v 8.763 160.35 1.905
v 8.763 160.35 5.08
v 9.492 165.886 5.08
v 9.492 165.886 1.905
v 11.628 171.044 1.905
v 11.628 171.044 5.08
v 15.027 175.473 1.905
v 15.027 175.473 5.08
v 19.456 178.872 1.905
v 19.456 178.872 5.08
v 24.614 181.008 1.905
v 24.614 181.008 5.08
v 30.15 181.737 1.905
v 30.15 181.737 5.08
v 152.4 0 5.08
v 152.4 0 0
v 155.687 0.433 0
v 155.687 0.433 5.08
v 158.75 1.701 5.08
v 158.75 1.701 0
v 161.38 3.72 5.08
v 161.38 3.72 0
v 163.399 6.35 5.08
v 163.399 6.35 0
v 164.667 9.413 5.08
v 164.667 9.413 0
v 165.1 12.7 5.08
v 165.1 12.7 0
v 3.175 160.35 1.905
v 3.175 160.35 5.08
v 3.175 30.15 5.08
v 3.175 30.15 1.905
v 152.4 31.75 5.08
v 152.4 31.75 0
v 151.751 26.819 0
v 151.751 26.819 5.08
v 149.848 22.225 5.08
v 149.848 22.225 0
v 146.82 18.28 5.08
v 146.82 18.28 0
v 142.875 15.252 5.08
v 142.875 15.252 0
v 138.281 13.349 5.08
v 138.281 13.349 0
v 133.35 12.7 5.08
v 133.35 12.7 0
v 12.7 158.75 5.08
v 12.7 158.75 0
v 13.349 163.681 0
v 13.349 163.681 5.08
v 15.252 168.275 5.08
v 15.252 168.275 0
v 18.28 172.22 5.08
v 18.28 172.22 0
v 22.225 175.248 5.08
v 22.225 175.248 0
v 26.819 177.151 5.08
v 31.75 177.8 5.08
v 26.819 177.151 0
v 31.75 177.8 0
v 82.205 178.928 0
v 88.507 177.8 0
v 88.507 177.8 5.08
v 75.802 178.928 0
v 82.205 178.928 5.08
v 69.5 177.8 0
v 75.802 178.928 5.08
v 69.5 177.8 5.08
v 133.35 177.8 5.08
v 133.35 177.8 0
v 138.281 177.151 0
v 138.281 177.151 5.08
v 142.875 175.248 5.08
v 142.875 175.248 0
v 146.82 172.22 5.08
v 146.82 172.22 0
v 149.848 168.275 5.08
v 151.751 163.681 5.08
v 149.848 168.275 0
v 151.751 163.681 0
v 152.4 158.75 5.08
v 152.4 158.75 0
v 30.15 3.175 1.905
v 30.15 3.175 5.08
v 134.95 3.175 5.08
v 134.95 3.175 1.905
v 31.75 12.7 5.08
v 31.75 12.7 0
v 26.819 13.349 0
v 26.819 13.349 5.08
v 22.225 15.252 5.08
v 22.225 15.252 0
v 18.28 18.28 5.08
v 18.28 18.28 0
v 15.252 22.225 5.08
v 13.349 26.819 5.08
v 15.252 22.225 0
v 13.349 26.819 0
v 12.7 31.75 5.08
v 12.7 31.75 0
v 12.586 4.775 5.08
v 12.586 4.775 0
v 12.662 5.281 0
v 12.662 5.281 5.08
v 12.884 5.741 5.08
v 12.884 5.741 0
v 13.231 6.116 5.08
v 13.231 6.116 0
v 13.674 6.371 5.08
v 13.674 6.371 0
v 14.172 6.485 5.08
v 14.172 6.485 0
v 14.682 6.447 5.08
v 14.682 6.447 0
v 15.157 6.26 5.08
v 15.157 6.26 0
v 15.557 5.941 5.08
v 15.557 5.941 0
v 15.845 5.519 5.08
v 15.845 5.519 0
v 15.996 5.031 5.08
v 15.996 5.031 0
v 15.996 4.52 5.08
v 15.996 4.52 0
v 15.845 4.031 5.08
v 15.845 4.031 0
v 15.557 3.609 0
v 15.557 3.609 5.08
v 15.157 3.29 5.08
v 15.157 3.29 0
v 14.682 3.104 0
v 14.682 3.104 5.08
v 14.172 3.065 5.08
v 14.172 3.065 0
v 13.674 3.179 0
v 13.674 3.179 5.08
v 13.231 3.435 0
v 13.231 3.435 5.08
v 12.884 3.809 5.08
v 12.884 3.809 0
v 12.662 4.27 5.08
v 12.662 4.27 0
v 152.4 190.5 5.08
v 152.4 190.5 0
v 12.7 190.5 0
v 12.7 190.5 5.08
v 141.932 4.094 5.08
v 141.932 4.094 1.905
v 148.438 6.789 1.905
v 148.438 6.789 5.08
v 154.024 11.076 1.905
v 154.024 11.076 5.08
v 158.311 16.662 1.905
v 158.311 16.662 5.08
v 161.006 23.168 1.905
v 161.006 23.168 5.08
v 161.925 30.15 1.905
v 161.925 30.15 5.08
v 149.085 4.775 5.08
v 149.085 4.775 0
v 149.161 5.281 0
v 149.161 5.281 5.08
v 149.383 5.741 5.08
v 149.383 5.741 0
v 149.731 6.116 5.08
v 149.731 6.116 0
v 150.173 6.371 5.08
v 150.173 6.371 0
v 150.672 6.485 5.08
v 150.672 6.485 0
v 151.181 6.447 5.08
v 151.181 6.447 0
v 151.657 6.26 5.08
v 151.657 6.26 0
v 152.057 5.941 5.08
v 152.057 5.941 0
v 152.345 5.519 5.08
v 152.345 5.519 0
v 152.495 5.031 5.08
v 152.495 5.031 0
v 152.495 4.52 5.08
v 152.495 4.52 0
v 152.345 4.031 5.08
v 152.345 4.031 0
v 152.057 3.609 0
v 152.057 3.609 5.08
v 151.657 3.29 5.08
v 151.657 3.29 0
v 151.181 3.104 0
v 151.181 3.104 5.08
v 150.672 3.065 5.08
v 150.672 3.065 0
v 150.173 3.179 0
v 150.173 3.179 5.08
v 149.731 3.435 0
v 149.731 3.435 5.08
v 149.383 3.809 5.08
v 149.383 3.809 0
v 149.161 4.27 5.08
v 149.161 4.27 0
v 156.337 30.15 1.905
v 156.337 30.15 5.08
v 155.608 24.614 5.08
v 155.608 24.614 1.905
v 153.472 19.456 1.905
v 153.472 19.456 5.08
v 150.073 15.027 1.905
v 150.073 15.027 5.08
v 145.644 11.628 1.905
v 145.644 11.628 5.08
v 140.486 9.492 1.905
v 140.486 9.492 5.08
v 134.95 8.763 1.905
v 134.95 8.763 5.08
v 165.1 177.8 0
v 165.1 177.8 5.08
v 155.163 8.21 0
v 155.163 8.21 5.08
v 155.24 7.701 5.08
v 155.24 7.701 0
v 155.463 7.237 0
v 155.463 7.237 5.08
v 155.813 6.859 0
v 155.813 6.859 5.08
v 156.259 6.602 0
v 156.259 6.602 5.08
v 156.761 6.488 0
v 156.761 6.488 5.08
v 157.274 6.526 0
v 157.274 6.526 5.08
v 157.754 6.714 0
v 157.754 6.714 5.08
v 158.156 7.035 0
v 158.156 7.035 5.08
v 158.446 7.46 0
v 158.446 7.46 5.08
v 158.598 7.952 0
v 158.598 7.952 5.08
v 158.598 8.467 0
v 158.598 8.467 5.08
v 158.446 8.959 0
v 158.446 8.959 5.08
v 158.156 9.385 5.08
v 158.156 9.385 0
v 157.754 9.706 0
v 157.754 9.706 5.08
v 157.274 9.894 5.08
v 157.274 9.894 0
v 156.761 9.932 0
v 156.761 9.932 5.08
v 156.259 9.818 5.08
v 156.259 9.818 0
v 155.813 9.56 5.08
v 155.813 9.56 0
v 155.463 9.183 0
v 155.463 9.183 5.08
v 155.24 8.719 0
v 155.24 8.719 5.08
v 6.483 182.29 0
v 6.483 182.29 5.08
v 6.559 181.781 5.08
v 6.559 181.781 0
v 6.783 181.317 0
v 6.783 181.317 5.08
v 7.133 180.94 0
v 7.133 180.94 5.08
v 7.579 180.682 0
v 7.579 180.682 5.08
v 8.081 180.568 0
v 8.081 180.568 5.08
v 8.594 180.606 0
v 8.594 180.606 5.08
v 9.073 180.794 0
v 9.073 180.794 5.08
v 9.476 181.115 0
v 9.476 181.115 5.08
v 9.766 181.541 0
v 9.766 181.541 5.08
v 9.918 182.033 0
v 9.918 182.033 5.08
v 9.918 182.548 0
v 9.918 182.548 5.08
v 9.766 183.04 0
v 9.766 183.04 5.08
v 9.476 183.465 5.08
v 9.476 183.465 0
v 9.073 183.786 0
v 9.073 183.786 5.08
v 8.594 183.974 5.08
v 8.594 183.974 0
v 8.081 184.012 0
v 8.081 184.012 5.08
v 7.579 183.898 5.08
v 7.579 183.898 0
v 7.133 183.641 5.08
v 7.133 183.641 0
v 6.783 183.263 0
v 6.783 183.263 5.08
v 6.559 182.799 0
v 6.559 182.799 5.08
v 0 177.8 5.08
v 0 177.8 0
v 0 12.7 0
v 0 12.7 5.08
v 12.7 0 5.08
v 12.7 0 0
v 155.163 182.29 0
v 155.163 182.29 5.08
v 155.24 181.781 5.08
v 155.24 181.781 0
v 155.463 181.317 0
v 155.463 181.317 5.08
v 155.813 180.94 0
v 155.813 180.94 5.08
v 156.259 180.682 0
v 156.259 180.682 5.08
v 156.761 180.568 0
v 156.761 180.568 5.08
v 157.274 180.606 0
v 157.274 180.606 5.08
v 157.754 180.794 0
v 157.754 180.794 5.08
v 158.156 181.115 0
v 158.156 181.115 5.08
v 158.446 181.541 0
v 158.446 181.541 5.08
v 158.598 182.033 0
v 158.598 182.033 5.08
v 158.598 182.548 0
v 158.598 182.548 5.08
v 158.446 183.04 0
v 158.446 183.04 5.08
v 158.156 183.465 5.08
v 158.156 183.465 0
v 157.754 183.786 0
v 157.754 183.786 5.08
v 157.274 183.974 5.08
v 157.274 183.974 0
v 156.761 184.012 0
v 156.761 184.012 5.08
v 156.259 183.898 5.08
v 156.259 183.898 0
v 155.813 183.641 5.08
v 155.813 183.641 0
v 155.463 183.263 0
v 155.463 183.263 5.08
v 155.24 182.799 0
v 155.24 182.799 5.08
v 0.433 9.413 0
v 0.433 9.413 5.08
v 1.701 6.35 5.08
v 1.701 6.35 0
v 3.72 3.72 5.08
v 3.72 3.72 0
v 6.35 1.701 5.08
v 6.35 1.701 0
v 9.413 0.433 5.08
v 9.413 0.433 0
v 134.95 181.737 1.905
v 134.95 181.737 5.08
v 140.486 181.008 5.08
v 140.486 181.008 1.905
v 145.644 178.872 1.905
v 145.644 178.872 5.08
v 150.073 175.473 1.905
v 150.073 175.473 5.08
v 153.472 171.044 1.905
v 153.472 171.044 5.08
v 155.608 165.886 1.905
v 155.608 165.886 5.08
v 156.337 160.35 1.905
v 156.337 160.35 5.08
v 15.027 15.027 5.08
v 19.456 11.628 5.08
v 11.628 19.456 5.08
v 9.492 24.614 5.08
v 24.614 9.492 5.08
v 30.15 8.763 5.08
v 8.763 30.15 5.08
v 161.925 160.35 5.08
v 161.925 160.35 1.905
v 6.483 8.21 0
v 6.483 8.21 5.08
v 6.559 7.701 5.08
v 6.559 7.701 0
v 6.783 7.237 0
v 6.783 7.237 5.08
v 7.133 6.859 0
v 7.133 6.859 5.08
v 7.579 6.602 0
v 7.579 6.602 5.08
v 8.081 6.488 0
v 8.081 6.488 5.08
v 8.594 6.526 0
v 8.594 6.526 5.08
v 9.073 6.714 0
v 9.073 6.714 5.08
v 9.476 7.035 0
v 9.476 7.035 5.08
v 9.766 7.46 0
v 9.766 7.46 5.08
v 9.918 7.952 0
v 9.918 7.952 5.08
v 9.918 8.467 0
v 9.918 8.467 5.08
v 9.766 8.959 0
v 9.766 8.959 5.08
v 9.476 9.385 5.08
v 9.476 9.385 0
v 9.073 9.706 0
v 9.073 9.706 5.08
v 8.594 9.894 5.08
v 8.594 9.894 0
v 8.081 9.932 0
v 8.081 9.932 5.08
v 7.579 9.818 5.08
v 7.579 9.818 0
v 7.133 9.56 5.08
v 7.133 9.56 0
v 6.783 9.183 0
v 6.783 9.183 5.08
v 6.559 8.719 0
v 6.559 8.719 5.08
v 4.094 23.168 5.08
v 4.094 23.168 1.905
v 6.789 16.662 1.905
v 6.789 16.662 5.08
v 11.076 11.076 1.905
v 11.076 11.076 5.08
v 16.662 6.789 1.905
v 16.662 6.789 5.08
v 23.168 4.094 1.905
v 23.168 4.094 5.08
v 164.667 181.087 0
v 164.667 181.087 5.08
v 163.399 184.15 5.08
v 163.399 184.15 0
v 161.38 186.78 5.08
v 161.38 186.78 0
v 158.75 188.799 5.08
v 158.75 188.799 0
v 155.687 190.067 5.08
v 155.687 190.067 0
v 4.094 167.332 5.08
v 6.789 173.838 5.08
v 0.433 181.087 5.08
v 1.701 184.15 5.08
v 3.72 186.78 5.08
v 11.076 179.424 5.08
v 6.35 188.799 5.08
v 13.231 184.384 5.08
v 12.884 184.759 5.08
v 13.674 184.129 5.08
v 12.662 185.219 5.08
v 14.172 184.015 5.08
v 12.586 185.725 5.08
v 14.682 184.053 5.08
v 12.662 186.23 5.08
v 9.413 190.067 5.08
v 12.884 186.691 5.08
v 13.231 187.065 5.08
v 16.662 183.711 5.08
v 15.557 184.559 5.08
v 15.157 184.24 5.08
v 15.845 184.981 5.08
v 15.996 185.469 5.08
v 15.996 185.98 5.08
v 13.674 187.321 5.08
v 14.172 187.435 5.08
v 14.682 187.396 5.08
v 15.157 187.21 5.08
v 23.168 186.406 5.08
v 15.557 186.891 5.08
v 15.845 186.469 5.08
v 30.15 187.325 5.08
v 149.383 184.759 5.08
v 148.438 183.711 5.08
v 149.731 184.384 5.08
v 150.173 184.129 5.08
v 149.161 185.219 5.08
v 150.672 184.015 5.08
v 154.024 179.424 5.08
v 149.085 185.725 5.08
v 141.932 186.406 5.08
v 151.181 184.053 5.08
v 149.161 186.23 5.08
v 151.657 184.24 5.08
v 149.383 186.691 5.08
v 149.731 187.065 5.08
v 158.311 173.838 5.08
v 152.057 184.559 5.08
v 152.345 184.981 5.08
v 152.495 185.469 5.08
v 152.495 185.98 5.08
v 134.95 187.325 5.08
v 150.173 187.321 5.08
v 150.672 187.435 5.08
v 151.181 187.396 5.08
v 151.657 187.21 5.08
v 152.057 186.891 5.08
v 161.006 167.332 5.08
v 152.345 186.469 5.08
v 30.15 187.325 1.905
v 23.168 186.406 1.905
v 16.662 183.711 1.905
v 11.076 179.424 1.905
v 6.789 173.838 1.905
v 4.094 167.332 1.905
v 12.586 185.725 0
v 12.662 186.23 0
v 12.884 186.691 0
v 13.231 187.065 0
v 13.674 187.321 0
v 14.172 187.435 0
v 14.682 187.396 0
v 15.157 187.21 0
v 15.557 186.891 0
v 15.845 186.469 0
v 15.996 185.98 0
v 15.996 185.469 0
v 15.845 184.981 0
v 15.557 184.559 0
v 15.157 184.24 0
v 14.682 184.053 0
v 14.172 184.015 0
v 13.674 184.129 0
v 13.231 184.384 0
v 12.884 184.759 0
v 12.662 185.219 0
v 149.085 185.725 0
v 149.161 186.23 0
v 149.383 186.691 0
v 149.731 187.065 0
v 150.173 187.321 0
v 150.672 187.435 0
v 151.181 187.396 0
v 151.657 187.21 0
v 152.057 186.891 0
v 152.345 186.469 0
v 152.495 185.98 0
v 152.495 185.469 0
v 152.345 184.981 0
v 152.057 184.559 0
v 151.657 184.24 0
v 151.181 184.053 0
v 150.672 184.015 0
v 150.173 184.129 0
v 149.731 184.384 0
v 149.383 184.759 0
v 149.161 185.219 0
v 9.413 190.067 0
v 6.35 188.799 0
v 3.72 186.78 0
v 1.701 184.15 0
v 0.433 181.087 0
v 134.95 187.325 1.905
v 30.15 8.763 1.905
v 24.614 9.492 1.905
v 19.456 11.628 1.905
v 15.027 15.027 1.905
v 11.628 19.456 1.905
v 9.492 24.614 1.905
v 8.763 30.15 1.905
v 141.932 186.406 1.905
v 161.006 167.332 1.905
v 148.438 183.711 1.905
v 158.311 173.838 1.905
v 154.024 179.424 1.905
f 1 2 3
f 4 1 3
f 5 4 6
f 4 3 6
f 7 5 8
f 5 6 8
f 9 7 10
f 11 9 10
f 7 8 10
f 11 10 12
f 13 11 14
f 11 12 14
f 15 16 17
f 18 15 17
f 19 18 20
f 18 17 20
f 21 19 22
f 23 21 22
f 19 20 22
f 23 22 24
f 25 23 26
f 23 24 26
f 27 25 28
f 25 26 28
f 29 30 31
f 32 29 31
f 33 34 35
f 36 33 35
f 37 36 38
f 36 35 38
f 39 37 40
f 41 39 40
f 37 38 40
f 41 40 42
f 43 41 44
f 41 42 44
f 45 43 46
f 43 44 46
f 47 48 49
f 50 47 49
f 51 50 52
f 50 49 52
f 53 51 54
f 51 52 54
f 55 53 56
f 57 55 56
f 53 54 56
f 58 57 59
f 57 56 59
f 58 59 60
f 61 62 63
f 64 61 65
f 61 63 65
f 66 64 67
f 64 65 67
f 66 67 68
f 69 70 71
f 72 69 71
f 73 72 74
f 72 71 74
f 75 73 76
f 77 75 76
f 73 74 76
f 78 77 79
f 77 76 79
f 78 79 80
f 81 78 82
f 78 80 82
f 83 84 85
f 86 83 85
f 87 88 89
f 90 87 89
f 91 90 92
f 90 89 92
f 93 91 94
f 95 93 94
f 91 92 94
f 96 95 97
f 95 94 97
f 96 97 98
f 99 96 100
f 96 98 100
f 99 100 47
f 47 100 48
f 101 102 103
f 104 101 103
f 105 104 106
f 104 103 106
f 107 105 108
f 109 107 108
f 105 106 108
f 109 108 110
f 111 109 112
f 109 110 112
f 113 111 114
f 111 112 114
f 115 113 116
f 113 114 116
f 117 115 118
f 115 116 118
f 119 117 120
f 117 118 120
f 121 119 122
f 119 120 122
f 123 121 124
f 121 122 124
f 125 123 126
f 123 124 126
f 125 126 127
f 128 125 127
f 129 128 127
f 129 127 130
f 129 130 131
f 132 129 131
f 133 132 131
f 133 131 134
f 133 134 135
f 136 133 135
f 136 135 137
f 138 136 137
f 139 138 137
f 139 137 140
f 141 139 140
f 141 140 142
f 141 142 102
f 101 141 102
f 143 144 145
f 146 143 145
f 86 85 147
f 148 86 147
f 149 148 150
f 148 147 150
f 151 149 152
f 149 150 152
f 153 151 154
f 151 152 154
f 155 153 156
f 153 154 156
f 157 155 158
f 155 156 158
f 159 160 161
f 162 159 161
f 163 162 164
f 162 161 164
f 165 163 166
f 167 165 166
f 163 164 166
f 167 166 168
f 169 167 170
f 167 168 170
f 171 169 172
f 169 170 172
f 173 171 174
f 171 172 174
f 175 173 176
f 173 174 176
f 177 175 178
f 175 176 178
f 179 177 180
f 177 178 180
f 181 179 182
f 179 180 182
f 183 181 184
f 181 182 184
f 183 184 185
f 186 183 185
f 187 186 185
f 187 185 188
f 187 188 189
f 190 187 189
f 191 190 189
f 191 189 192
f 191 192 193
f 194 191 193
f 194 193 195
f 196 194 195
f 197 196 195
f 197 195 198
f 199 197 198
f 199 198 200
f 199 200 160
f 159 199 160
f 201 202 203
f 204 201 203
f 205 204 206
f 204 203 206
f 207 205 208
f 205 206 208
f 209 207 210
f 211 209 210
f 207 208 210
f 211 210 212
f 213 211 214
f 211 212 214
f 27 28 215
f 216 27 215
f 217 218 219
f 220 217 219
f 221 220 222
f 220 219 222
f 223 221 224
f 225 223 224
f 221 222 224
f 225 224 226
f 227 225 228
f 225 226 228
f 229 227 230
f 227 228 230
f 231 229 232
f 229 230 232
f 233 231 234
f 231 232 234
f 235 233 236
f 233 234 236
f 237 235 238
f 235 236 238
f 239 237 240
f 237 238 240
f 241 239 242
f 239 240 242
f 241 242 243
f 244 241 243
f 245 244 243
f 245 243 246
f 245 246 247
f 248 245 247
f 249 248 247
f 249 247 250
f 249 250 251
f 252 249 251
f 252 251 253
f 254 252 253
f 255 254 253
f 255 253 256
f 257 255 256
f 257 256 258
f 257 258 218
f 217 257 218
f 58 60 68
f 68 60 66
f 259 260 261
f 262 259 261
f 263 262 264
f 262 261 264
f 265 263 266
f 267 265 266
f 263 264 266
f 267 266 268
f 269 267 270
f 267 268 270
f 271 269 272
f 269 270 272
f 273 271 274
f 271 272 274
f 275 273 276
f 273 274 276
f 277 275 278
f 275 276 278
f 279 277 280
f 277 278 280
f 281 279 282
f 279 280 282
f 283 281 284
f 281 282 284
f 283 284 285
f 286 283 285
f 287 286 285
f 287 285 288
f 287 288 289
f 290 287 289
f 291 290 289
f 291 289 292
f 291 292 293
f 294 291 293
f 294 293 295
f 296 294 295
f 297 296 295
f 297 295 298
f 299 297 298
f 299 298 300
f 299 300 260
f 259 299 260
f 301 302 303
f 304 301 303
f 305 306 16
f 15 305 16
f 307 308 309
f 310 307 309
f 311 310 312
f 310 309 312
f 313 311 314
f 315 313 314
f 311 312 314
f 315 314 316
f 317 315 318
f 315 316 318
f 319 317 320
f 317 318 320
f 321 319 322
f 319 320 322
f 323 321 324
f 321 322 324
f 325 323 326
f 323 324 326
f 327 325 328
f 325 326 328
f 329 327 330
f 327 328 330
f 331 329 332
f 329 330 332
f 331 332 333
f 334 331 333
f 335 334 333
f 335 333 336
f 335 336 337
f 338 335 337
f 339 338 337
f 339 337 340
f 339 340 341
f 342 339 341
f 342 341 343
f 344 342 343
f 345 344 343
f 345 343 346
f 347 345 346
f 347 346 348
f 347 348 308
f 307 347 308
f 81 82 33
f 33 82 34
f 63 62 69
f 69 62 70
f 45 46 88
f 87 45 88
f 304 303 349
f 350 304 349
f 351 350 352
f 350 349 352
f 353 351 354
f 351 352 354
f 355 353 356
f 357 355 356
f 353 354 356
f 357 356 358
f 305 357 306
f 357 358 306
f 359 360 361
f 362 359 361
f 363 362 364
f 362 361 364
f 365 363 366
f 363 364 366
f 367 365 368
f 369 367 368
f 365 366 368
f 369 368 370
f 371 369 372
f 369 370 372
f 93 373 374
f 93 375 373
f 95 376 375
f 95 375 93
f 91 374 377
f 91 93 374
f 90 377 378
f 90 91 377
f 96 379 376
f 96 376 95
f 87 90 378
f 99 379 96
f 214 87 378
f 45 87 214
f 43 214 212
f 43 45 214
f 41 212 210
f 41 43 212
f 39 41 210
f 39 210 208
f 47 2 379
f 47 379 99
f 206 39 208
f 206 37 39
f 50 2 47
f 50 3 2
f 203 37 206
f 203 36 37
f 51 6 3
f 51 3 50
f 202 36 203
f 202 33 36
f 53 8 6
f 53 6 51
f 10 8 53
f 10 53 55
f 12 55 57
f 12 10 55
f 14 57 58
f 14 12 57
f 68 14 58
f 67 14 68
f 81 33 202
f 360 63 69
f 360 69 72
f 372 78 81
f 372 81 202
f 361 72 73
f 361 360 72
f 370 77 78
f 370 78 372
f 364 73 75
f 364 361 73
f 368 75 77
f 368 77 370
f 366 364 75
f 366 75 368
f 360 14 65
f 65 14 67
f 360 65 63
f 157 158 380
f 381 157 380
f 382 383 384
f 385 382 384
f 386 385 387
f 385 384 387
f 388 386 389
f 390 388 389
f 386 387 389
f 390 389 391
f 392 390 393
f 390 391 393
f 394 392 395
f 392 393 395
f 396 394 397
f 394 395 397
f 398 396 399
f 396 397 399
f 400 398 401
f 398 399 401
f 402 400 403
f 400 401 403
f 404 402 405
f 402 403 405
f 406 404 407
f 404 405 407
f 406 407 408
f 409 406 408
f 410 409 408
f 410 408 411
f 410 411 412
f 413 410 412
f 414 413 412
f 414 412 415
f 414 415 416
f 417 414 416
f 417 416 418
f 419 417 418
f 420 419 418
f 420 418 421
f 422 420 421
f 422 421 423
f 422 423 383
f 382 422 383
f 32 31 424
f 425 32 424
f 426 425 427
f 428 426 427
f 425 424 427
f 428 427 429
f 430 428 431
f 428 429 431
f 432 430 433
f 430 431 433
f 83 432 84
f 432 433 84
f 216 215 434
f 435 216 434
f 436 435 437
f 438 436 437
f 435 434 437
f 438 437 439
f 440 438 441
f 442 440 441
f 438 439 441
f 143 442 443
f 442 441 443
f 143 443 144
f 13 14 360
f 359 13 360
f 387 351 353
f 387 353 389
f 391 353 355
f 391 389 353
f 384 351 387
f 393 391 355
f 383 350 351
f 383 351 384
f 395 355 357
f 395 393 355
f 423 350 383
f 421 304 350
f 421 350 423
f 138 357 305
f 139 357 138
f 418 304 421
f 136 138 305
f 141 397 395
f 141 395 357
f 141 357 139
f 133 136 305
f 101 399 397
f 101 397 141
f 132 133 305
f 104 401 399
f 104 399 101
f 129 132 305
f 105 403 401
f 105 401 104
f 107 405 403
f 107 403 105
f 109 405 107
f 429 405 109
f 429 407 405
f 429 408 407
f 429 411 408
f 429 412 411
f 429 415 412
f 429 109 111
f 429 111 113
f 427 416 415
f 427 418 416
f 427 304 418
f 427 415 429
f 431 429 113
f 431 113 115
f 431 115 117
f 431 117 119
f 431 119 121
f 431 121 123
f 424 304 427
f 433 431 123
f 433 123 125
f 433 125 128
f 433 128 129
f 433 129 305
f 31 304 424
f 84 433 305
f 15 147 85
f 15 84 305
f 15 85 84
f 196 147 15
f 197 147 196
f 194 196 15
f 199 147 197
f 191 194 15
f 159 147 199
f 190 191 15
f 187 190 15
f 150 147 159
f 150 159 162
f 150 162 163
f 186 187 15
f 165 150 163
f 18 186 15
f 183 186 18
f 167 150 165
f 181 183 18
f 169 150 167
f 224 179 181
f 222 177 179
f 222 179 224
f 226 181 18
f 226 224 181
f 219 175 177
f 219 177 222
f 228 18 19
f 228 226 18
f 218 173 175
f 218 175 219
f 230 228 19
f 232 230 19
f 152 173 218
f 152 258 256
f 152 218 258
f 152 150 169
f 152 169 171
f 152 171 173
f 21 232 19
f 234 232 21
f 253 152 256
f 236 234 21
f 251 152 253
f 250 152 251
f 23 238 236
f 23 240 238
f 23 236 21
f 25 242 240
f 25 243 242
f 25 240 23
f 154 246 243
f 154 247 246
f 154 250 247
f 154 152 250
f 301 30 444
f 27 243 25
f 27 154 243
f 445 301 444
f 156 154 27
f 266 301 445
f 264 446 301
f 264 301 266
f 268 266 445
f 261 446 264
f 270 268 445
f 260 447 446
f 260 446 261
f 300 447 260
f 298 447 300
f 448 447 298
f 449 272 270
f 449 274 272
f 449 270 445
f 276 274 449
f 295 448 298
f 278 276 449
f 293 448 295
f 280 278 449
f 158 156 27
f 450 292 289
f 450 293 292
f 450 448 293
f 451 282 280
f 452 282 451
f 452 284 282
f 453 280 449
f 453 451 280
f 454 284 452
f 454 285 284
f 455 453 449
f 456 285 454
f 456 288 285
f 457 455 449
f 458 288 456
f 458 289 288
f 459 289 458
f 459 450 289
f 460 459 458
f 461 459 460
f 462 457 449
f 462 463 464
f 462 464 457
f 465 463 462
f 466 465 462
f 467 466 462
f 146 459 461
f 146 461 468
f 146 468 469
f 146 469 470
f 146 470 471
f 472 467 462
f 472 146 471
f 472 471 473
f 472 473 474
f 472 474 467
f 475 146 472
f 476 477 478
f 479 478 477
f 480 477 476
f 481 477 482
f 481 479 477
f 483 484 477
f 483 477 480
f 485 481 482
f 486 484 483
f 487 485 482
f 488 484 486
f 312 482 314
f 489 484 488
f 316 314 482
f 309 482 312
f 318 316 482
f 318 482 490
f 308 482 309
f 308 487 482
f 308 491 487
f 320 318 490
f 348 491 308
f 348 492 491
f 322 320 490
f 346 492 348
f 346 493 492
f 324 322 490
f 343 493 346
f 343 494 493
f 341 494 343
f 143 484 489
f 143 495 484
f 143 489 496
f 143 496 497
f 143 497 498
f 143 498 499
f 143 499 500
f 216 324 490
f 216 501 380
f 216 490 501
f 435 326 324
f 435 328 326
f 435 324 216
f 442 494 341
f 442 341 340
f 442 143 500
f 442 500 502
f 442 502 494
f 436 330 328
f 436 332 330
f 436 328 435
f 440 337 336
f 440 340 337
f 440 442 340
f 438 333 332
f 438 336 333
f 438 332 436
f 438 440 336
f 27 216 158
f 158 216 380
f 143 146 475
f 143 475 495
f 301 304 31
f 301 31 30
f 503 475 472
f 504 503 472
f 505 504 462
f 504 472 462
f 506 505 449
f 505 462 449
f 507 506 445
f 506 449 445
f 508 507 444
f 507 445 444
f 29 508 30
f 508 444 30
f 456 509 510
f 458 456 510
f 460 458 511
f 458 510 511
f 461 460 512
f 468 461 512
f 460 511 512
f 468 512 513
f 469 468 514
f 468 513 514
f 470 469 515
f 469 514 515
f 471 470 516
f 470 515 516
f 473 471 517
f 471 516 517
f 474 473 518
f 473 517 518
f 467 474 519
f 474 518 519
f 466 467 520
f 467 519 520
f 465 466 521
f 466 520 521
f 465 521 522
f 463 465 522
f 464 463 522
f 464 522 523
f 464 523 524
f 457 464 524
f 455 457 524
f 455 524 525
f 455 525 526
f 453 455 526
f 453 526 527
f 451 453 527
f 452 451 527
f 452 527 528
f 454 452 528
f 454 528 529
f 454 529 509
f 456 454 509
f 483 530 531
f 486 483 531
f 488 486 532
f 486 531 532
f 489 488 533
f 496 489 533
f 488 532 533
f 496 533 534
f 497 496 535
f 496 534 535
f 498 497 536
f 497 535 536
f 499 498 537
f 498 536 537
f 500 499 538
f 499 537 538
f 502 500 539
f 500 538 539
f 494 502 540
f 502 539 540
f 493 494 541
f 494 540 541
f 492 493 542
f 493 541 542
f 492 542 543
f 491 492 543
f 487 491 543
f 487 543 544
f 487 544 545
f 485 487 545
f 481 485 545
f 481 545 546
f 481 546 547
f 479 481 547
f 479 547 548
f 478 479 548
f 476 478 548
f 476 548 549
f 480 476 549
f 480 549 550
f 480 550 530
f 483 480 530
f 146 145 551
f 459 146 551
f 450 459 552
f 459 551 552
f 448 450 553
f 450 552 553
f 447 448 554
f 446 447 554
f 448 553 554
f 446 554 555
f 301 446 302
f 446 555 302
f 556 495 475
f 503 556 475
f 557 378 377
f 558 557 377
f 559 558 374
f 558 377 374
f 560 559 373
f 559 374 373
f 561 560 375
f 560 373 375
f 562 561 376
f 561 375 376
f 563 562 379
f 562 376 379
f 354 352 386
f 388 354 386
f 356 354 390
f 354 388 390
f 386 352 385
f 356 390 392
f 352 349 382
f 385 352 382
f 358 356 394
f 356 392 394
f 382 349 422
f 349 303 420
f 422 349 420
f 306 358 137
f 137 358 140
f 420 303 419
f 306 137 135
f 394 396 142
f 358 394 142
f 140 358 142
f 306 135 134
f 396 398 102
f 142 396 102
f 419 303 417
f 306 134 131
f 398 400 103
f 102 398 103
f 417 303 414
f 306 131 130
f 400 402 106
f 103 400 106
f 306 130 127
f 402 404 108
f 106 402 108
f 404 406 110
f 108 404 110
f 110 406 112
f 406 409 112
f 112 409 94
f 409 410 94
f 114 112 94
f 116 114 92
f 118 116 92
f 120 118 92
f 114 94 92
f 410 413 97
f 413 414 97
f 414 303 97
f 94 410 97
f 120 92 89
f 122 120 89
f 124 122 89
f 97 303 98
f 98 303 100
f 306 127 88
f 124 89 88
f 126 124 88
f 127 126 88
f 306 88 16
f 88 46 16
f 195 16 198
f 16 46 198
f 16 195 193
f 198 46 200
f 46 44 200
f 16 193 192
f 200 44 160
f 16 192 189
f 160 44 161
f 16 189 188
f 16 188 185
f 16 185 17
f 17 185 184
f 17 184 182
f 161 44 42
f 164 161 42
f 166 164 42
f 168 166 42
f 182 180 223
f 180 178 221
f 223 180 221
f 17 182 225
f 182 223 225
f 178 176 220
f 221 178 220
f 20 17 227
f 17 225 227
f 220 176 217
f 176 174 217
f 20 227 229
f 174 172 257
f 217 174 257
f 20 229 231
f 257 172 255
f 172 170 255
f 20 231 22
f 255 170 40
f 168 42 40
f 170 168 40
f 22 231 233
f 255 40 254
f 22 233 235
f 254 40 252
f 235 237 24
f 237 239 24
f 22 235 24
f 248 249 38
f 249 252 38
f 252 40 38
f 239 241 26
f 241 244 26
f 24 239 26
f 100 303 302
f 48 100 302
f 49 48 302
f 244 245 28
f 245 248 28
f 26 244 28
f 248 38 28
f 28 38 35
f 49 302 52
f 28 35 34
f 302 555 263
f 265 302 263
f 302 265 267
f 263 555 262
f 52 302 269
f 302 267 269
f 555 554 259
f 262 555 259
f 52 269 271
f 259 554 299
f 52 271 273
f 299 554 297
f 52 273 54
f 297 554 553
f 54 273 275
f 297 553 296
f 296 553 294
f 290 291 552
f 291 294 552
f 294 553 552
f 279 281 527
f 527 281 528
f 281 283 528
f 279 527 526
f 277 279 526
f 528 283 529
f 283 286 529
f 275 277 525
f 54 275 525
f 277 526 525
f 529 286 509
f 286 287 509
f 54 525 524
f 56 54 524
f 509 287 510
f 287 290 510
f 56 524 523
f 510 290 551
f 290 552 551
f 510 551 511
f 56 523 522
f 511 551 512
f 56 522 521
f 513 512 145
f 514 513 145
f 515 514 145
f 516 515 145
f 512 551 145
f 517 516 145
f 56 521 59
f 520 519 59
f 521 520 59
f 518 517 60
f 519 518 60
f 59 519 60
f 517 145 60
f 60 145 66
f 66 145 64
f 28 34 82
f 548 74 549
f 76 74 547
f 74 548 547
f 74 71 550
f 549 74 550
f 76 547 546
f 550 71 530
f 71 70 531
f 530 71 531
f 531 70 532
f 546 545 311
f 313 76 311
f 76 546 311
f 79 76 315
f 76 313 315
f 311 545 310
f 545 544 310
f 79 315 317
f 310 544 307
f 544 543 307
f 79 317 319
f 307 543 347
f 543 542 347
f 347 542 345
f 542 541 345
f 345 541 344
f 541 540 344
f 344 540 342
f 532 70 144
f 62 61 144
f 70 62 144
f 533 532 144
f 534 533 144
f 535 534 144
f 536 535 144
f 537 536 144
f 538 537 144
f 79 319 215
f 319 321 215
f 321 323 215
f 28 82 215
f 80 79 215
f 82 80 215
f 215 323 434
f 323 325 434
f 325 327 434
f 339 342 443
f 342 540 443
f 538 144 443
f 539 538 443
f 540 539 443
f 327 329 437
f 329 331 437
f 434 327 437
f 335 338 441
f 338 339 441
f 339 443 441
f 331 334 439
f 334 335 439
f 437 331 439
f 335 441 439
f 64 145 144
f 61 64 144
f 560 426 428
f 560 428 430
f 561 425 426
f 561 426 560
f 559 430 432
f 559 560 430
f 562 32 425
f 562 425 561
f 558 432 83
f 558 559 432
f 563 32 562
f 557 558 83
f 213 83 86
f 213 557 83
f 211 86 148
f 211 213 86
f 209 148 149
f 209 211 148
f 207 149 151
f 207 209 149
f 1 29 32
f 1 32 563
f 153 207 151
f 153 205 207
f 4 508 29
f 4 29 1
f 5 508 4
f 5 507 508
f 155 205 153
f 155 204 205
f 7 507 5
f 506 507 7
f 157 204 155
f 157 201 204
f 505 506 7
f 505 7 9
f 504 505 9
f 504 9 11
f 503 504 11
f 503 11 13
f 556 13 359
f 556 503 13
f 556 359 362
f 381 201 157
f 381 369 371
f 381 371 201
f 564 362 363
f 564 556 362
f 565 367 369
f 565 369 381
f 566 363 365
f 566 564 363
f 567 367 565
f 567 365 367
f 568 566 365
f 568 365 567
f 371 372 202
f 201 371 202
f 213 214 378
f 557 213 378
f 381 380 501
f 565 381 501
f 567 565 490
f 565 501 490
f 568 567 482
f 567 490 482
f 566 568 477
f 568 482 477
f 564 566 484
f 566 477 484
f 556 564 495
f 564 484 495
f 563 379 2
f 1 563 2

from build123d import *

# Parameters (mm, degrees)
F1_DEPTH = 5.08
F3_DEPTH = 3.175
F5_D     = 3.4544
F7_D     = 3.429
F8_R     = 36.195
F9_DEPTH = 5.081


with BuildPart() as f1:
    # F0 (on Top) → F1 (new body)
    with BuildSketch(Plane.XY):
        with BuildLine():
            ThreePointArc((0, 12.7), (3.7197438789, 3.7197438789), (12.7, 0))
            Line((12.7, 0), (152.4, 0))
            ThreePointArc((152.4, 0), (161.3802561211, 3.7197438789), (165.1, 12.7))
            Line((165.1, 12.7), (165.1, 177.8))
            ThreePointArc((165.1, 177.8), (161.3802561211, 186.7802561211), (152.4, 190.5))
            Line((152.4, 190.5), (12.7, 190.5))
            ThreePointArc((12.7, 190.5), (3.7197438789, 186.7802561211), (0, 177.8))
            Line((0, 177.8), (0, 12.7))
        make_face()
        with BuildLine():
            ThreePointArc((12.7, 158.75), (18.2796158184, 172.2203841816), (31.75, 177.8))
            Line((31.75, 177.8), (133.35, 177.8))
            ThreePointArc((133.35, 177.8), (146.8203841816, 172.2203841816), (152.4, 158.75))
            Line((152.4, 158.75), (152.4, 31.75))
            ThreePointArc((152.4, 31.75), (146.8203841816, 18.2796158184), (133.35, 12.7))
            Line((133.35, 12.7), (31.75, 12.7))
            ThreePointArc((31.75, 12.7), (18.2796158184, 18.2796158184), (12.7, 31.75))
            Line((12.7, 31.75), (12.7, 158.75))
        make_face(mode=Mode.SUBTRACT)
    extrude(amount=F1_DEPTH)

    # F2 (on face) → F3 (cut)
    with BuildSketch(Plane.XY.offset(5.08)):
        with BuildLine():
            ThreePointArc((3.175, 30.1498), (11.0757359988, 11.0757359988), (30.1498, 3.175))
            Line((30.1498, 3.175), (134.9502, 3.175))
            ThreePointArc((134.9502, 3.175), (154.0242640012, 11.0757359988), (161.925, 30.1498))
            Line((161.925, 30.1498), (161.925, 160.3502))
            ThreePointArc((161.925, 160.3502), (154.0242640012, 179.4242640012), (134.9502, 187.325))
            Line((134.9502, 187.325), (30.1498, 187.325))
            ThreePointArc((30.1498, 187.325), (11.0757359988, 179.4242640012), (3.175, 160.3502))
            Line((3.175, 160.3502), (3.175, 30.1498))
        make_face()
        with BuildLine():
            ThreePointArc((30.1498, 8.763), (15.0270486921, 15.0270486921), (8.763, 30.1498))
            Line((8.763, 30.1498), (8.763, 160.3502))
            ThreePointArc((8.763, 160.3502), (15.0270486921, 175.4729513079), (30.1498, 181.737))
            Line((30.1498, 181.737), (134.9502, 181.737))
            ThreePointArc((134.9502, 181.737), (150.0729513079, 175.4729513079), (156.337, 160.3502))
            Line((156.337, 160.3502), (156.337, 30.1498))
            ThreePointArc((156.337, 30.1498), (150.0729513079, 15.0270486921), (134.9502, 8.763))
            Line((134.9502, 8.763), (30.1498, 8.763))
        make_face(mode=Mode.SUBTRACT)
    extrude(amount=-F3_DEPTH, mode=Mode.SUBTRACT)

    # F5 (through all)
    with Locations(Plane(origin=(0, 0, 0), x_dir=(1, 0, 0), z_dir=(0, 0, -1))):
        with Locations((8.2098719395, -182.2901280605), (156.8901280605, -182.2901280605), (156.8901280605, -8.2098719395), (8.2098719395, -8.2098719395)):
            Hole(F5_D / 2)

    # F7 (through all)
    with Locations(Plane.XY.offset(5.08)):
        with Locations((14.3002, 185.7248), (150.7998, 185.7248), (14.3002, 4.7752), (150.7998, 4.7752)):
            Hole(F7_D / 2)

    # F8 (on face) → F9 (cut, through all)
    with BuildSketch(Plane.XY.offset(5.08)):
        with Locations((79.0035873652, 142.875)):
            Circle(F8_R)
    extrude(amount=-F9_DEPTH, mode=Mode.SUBTRACT)


solid = f1.part
